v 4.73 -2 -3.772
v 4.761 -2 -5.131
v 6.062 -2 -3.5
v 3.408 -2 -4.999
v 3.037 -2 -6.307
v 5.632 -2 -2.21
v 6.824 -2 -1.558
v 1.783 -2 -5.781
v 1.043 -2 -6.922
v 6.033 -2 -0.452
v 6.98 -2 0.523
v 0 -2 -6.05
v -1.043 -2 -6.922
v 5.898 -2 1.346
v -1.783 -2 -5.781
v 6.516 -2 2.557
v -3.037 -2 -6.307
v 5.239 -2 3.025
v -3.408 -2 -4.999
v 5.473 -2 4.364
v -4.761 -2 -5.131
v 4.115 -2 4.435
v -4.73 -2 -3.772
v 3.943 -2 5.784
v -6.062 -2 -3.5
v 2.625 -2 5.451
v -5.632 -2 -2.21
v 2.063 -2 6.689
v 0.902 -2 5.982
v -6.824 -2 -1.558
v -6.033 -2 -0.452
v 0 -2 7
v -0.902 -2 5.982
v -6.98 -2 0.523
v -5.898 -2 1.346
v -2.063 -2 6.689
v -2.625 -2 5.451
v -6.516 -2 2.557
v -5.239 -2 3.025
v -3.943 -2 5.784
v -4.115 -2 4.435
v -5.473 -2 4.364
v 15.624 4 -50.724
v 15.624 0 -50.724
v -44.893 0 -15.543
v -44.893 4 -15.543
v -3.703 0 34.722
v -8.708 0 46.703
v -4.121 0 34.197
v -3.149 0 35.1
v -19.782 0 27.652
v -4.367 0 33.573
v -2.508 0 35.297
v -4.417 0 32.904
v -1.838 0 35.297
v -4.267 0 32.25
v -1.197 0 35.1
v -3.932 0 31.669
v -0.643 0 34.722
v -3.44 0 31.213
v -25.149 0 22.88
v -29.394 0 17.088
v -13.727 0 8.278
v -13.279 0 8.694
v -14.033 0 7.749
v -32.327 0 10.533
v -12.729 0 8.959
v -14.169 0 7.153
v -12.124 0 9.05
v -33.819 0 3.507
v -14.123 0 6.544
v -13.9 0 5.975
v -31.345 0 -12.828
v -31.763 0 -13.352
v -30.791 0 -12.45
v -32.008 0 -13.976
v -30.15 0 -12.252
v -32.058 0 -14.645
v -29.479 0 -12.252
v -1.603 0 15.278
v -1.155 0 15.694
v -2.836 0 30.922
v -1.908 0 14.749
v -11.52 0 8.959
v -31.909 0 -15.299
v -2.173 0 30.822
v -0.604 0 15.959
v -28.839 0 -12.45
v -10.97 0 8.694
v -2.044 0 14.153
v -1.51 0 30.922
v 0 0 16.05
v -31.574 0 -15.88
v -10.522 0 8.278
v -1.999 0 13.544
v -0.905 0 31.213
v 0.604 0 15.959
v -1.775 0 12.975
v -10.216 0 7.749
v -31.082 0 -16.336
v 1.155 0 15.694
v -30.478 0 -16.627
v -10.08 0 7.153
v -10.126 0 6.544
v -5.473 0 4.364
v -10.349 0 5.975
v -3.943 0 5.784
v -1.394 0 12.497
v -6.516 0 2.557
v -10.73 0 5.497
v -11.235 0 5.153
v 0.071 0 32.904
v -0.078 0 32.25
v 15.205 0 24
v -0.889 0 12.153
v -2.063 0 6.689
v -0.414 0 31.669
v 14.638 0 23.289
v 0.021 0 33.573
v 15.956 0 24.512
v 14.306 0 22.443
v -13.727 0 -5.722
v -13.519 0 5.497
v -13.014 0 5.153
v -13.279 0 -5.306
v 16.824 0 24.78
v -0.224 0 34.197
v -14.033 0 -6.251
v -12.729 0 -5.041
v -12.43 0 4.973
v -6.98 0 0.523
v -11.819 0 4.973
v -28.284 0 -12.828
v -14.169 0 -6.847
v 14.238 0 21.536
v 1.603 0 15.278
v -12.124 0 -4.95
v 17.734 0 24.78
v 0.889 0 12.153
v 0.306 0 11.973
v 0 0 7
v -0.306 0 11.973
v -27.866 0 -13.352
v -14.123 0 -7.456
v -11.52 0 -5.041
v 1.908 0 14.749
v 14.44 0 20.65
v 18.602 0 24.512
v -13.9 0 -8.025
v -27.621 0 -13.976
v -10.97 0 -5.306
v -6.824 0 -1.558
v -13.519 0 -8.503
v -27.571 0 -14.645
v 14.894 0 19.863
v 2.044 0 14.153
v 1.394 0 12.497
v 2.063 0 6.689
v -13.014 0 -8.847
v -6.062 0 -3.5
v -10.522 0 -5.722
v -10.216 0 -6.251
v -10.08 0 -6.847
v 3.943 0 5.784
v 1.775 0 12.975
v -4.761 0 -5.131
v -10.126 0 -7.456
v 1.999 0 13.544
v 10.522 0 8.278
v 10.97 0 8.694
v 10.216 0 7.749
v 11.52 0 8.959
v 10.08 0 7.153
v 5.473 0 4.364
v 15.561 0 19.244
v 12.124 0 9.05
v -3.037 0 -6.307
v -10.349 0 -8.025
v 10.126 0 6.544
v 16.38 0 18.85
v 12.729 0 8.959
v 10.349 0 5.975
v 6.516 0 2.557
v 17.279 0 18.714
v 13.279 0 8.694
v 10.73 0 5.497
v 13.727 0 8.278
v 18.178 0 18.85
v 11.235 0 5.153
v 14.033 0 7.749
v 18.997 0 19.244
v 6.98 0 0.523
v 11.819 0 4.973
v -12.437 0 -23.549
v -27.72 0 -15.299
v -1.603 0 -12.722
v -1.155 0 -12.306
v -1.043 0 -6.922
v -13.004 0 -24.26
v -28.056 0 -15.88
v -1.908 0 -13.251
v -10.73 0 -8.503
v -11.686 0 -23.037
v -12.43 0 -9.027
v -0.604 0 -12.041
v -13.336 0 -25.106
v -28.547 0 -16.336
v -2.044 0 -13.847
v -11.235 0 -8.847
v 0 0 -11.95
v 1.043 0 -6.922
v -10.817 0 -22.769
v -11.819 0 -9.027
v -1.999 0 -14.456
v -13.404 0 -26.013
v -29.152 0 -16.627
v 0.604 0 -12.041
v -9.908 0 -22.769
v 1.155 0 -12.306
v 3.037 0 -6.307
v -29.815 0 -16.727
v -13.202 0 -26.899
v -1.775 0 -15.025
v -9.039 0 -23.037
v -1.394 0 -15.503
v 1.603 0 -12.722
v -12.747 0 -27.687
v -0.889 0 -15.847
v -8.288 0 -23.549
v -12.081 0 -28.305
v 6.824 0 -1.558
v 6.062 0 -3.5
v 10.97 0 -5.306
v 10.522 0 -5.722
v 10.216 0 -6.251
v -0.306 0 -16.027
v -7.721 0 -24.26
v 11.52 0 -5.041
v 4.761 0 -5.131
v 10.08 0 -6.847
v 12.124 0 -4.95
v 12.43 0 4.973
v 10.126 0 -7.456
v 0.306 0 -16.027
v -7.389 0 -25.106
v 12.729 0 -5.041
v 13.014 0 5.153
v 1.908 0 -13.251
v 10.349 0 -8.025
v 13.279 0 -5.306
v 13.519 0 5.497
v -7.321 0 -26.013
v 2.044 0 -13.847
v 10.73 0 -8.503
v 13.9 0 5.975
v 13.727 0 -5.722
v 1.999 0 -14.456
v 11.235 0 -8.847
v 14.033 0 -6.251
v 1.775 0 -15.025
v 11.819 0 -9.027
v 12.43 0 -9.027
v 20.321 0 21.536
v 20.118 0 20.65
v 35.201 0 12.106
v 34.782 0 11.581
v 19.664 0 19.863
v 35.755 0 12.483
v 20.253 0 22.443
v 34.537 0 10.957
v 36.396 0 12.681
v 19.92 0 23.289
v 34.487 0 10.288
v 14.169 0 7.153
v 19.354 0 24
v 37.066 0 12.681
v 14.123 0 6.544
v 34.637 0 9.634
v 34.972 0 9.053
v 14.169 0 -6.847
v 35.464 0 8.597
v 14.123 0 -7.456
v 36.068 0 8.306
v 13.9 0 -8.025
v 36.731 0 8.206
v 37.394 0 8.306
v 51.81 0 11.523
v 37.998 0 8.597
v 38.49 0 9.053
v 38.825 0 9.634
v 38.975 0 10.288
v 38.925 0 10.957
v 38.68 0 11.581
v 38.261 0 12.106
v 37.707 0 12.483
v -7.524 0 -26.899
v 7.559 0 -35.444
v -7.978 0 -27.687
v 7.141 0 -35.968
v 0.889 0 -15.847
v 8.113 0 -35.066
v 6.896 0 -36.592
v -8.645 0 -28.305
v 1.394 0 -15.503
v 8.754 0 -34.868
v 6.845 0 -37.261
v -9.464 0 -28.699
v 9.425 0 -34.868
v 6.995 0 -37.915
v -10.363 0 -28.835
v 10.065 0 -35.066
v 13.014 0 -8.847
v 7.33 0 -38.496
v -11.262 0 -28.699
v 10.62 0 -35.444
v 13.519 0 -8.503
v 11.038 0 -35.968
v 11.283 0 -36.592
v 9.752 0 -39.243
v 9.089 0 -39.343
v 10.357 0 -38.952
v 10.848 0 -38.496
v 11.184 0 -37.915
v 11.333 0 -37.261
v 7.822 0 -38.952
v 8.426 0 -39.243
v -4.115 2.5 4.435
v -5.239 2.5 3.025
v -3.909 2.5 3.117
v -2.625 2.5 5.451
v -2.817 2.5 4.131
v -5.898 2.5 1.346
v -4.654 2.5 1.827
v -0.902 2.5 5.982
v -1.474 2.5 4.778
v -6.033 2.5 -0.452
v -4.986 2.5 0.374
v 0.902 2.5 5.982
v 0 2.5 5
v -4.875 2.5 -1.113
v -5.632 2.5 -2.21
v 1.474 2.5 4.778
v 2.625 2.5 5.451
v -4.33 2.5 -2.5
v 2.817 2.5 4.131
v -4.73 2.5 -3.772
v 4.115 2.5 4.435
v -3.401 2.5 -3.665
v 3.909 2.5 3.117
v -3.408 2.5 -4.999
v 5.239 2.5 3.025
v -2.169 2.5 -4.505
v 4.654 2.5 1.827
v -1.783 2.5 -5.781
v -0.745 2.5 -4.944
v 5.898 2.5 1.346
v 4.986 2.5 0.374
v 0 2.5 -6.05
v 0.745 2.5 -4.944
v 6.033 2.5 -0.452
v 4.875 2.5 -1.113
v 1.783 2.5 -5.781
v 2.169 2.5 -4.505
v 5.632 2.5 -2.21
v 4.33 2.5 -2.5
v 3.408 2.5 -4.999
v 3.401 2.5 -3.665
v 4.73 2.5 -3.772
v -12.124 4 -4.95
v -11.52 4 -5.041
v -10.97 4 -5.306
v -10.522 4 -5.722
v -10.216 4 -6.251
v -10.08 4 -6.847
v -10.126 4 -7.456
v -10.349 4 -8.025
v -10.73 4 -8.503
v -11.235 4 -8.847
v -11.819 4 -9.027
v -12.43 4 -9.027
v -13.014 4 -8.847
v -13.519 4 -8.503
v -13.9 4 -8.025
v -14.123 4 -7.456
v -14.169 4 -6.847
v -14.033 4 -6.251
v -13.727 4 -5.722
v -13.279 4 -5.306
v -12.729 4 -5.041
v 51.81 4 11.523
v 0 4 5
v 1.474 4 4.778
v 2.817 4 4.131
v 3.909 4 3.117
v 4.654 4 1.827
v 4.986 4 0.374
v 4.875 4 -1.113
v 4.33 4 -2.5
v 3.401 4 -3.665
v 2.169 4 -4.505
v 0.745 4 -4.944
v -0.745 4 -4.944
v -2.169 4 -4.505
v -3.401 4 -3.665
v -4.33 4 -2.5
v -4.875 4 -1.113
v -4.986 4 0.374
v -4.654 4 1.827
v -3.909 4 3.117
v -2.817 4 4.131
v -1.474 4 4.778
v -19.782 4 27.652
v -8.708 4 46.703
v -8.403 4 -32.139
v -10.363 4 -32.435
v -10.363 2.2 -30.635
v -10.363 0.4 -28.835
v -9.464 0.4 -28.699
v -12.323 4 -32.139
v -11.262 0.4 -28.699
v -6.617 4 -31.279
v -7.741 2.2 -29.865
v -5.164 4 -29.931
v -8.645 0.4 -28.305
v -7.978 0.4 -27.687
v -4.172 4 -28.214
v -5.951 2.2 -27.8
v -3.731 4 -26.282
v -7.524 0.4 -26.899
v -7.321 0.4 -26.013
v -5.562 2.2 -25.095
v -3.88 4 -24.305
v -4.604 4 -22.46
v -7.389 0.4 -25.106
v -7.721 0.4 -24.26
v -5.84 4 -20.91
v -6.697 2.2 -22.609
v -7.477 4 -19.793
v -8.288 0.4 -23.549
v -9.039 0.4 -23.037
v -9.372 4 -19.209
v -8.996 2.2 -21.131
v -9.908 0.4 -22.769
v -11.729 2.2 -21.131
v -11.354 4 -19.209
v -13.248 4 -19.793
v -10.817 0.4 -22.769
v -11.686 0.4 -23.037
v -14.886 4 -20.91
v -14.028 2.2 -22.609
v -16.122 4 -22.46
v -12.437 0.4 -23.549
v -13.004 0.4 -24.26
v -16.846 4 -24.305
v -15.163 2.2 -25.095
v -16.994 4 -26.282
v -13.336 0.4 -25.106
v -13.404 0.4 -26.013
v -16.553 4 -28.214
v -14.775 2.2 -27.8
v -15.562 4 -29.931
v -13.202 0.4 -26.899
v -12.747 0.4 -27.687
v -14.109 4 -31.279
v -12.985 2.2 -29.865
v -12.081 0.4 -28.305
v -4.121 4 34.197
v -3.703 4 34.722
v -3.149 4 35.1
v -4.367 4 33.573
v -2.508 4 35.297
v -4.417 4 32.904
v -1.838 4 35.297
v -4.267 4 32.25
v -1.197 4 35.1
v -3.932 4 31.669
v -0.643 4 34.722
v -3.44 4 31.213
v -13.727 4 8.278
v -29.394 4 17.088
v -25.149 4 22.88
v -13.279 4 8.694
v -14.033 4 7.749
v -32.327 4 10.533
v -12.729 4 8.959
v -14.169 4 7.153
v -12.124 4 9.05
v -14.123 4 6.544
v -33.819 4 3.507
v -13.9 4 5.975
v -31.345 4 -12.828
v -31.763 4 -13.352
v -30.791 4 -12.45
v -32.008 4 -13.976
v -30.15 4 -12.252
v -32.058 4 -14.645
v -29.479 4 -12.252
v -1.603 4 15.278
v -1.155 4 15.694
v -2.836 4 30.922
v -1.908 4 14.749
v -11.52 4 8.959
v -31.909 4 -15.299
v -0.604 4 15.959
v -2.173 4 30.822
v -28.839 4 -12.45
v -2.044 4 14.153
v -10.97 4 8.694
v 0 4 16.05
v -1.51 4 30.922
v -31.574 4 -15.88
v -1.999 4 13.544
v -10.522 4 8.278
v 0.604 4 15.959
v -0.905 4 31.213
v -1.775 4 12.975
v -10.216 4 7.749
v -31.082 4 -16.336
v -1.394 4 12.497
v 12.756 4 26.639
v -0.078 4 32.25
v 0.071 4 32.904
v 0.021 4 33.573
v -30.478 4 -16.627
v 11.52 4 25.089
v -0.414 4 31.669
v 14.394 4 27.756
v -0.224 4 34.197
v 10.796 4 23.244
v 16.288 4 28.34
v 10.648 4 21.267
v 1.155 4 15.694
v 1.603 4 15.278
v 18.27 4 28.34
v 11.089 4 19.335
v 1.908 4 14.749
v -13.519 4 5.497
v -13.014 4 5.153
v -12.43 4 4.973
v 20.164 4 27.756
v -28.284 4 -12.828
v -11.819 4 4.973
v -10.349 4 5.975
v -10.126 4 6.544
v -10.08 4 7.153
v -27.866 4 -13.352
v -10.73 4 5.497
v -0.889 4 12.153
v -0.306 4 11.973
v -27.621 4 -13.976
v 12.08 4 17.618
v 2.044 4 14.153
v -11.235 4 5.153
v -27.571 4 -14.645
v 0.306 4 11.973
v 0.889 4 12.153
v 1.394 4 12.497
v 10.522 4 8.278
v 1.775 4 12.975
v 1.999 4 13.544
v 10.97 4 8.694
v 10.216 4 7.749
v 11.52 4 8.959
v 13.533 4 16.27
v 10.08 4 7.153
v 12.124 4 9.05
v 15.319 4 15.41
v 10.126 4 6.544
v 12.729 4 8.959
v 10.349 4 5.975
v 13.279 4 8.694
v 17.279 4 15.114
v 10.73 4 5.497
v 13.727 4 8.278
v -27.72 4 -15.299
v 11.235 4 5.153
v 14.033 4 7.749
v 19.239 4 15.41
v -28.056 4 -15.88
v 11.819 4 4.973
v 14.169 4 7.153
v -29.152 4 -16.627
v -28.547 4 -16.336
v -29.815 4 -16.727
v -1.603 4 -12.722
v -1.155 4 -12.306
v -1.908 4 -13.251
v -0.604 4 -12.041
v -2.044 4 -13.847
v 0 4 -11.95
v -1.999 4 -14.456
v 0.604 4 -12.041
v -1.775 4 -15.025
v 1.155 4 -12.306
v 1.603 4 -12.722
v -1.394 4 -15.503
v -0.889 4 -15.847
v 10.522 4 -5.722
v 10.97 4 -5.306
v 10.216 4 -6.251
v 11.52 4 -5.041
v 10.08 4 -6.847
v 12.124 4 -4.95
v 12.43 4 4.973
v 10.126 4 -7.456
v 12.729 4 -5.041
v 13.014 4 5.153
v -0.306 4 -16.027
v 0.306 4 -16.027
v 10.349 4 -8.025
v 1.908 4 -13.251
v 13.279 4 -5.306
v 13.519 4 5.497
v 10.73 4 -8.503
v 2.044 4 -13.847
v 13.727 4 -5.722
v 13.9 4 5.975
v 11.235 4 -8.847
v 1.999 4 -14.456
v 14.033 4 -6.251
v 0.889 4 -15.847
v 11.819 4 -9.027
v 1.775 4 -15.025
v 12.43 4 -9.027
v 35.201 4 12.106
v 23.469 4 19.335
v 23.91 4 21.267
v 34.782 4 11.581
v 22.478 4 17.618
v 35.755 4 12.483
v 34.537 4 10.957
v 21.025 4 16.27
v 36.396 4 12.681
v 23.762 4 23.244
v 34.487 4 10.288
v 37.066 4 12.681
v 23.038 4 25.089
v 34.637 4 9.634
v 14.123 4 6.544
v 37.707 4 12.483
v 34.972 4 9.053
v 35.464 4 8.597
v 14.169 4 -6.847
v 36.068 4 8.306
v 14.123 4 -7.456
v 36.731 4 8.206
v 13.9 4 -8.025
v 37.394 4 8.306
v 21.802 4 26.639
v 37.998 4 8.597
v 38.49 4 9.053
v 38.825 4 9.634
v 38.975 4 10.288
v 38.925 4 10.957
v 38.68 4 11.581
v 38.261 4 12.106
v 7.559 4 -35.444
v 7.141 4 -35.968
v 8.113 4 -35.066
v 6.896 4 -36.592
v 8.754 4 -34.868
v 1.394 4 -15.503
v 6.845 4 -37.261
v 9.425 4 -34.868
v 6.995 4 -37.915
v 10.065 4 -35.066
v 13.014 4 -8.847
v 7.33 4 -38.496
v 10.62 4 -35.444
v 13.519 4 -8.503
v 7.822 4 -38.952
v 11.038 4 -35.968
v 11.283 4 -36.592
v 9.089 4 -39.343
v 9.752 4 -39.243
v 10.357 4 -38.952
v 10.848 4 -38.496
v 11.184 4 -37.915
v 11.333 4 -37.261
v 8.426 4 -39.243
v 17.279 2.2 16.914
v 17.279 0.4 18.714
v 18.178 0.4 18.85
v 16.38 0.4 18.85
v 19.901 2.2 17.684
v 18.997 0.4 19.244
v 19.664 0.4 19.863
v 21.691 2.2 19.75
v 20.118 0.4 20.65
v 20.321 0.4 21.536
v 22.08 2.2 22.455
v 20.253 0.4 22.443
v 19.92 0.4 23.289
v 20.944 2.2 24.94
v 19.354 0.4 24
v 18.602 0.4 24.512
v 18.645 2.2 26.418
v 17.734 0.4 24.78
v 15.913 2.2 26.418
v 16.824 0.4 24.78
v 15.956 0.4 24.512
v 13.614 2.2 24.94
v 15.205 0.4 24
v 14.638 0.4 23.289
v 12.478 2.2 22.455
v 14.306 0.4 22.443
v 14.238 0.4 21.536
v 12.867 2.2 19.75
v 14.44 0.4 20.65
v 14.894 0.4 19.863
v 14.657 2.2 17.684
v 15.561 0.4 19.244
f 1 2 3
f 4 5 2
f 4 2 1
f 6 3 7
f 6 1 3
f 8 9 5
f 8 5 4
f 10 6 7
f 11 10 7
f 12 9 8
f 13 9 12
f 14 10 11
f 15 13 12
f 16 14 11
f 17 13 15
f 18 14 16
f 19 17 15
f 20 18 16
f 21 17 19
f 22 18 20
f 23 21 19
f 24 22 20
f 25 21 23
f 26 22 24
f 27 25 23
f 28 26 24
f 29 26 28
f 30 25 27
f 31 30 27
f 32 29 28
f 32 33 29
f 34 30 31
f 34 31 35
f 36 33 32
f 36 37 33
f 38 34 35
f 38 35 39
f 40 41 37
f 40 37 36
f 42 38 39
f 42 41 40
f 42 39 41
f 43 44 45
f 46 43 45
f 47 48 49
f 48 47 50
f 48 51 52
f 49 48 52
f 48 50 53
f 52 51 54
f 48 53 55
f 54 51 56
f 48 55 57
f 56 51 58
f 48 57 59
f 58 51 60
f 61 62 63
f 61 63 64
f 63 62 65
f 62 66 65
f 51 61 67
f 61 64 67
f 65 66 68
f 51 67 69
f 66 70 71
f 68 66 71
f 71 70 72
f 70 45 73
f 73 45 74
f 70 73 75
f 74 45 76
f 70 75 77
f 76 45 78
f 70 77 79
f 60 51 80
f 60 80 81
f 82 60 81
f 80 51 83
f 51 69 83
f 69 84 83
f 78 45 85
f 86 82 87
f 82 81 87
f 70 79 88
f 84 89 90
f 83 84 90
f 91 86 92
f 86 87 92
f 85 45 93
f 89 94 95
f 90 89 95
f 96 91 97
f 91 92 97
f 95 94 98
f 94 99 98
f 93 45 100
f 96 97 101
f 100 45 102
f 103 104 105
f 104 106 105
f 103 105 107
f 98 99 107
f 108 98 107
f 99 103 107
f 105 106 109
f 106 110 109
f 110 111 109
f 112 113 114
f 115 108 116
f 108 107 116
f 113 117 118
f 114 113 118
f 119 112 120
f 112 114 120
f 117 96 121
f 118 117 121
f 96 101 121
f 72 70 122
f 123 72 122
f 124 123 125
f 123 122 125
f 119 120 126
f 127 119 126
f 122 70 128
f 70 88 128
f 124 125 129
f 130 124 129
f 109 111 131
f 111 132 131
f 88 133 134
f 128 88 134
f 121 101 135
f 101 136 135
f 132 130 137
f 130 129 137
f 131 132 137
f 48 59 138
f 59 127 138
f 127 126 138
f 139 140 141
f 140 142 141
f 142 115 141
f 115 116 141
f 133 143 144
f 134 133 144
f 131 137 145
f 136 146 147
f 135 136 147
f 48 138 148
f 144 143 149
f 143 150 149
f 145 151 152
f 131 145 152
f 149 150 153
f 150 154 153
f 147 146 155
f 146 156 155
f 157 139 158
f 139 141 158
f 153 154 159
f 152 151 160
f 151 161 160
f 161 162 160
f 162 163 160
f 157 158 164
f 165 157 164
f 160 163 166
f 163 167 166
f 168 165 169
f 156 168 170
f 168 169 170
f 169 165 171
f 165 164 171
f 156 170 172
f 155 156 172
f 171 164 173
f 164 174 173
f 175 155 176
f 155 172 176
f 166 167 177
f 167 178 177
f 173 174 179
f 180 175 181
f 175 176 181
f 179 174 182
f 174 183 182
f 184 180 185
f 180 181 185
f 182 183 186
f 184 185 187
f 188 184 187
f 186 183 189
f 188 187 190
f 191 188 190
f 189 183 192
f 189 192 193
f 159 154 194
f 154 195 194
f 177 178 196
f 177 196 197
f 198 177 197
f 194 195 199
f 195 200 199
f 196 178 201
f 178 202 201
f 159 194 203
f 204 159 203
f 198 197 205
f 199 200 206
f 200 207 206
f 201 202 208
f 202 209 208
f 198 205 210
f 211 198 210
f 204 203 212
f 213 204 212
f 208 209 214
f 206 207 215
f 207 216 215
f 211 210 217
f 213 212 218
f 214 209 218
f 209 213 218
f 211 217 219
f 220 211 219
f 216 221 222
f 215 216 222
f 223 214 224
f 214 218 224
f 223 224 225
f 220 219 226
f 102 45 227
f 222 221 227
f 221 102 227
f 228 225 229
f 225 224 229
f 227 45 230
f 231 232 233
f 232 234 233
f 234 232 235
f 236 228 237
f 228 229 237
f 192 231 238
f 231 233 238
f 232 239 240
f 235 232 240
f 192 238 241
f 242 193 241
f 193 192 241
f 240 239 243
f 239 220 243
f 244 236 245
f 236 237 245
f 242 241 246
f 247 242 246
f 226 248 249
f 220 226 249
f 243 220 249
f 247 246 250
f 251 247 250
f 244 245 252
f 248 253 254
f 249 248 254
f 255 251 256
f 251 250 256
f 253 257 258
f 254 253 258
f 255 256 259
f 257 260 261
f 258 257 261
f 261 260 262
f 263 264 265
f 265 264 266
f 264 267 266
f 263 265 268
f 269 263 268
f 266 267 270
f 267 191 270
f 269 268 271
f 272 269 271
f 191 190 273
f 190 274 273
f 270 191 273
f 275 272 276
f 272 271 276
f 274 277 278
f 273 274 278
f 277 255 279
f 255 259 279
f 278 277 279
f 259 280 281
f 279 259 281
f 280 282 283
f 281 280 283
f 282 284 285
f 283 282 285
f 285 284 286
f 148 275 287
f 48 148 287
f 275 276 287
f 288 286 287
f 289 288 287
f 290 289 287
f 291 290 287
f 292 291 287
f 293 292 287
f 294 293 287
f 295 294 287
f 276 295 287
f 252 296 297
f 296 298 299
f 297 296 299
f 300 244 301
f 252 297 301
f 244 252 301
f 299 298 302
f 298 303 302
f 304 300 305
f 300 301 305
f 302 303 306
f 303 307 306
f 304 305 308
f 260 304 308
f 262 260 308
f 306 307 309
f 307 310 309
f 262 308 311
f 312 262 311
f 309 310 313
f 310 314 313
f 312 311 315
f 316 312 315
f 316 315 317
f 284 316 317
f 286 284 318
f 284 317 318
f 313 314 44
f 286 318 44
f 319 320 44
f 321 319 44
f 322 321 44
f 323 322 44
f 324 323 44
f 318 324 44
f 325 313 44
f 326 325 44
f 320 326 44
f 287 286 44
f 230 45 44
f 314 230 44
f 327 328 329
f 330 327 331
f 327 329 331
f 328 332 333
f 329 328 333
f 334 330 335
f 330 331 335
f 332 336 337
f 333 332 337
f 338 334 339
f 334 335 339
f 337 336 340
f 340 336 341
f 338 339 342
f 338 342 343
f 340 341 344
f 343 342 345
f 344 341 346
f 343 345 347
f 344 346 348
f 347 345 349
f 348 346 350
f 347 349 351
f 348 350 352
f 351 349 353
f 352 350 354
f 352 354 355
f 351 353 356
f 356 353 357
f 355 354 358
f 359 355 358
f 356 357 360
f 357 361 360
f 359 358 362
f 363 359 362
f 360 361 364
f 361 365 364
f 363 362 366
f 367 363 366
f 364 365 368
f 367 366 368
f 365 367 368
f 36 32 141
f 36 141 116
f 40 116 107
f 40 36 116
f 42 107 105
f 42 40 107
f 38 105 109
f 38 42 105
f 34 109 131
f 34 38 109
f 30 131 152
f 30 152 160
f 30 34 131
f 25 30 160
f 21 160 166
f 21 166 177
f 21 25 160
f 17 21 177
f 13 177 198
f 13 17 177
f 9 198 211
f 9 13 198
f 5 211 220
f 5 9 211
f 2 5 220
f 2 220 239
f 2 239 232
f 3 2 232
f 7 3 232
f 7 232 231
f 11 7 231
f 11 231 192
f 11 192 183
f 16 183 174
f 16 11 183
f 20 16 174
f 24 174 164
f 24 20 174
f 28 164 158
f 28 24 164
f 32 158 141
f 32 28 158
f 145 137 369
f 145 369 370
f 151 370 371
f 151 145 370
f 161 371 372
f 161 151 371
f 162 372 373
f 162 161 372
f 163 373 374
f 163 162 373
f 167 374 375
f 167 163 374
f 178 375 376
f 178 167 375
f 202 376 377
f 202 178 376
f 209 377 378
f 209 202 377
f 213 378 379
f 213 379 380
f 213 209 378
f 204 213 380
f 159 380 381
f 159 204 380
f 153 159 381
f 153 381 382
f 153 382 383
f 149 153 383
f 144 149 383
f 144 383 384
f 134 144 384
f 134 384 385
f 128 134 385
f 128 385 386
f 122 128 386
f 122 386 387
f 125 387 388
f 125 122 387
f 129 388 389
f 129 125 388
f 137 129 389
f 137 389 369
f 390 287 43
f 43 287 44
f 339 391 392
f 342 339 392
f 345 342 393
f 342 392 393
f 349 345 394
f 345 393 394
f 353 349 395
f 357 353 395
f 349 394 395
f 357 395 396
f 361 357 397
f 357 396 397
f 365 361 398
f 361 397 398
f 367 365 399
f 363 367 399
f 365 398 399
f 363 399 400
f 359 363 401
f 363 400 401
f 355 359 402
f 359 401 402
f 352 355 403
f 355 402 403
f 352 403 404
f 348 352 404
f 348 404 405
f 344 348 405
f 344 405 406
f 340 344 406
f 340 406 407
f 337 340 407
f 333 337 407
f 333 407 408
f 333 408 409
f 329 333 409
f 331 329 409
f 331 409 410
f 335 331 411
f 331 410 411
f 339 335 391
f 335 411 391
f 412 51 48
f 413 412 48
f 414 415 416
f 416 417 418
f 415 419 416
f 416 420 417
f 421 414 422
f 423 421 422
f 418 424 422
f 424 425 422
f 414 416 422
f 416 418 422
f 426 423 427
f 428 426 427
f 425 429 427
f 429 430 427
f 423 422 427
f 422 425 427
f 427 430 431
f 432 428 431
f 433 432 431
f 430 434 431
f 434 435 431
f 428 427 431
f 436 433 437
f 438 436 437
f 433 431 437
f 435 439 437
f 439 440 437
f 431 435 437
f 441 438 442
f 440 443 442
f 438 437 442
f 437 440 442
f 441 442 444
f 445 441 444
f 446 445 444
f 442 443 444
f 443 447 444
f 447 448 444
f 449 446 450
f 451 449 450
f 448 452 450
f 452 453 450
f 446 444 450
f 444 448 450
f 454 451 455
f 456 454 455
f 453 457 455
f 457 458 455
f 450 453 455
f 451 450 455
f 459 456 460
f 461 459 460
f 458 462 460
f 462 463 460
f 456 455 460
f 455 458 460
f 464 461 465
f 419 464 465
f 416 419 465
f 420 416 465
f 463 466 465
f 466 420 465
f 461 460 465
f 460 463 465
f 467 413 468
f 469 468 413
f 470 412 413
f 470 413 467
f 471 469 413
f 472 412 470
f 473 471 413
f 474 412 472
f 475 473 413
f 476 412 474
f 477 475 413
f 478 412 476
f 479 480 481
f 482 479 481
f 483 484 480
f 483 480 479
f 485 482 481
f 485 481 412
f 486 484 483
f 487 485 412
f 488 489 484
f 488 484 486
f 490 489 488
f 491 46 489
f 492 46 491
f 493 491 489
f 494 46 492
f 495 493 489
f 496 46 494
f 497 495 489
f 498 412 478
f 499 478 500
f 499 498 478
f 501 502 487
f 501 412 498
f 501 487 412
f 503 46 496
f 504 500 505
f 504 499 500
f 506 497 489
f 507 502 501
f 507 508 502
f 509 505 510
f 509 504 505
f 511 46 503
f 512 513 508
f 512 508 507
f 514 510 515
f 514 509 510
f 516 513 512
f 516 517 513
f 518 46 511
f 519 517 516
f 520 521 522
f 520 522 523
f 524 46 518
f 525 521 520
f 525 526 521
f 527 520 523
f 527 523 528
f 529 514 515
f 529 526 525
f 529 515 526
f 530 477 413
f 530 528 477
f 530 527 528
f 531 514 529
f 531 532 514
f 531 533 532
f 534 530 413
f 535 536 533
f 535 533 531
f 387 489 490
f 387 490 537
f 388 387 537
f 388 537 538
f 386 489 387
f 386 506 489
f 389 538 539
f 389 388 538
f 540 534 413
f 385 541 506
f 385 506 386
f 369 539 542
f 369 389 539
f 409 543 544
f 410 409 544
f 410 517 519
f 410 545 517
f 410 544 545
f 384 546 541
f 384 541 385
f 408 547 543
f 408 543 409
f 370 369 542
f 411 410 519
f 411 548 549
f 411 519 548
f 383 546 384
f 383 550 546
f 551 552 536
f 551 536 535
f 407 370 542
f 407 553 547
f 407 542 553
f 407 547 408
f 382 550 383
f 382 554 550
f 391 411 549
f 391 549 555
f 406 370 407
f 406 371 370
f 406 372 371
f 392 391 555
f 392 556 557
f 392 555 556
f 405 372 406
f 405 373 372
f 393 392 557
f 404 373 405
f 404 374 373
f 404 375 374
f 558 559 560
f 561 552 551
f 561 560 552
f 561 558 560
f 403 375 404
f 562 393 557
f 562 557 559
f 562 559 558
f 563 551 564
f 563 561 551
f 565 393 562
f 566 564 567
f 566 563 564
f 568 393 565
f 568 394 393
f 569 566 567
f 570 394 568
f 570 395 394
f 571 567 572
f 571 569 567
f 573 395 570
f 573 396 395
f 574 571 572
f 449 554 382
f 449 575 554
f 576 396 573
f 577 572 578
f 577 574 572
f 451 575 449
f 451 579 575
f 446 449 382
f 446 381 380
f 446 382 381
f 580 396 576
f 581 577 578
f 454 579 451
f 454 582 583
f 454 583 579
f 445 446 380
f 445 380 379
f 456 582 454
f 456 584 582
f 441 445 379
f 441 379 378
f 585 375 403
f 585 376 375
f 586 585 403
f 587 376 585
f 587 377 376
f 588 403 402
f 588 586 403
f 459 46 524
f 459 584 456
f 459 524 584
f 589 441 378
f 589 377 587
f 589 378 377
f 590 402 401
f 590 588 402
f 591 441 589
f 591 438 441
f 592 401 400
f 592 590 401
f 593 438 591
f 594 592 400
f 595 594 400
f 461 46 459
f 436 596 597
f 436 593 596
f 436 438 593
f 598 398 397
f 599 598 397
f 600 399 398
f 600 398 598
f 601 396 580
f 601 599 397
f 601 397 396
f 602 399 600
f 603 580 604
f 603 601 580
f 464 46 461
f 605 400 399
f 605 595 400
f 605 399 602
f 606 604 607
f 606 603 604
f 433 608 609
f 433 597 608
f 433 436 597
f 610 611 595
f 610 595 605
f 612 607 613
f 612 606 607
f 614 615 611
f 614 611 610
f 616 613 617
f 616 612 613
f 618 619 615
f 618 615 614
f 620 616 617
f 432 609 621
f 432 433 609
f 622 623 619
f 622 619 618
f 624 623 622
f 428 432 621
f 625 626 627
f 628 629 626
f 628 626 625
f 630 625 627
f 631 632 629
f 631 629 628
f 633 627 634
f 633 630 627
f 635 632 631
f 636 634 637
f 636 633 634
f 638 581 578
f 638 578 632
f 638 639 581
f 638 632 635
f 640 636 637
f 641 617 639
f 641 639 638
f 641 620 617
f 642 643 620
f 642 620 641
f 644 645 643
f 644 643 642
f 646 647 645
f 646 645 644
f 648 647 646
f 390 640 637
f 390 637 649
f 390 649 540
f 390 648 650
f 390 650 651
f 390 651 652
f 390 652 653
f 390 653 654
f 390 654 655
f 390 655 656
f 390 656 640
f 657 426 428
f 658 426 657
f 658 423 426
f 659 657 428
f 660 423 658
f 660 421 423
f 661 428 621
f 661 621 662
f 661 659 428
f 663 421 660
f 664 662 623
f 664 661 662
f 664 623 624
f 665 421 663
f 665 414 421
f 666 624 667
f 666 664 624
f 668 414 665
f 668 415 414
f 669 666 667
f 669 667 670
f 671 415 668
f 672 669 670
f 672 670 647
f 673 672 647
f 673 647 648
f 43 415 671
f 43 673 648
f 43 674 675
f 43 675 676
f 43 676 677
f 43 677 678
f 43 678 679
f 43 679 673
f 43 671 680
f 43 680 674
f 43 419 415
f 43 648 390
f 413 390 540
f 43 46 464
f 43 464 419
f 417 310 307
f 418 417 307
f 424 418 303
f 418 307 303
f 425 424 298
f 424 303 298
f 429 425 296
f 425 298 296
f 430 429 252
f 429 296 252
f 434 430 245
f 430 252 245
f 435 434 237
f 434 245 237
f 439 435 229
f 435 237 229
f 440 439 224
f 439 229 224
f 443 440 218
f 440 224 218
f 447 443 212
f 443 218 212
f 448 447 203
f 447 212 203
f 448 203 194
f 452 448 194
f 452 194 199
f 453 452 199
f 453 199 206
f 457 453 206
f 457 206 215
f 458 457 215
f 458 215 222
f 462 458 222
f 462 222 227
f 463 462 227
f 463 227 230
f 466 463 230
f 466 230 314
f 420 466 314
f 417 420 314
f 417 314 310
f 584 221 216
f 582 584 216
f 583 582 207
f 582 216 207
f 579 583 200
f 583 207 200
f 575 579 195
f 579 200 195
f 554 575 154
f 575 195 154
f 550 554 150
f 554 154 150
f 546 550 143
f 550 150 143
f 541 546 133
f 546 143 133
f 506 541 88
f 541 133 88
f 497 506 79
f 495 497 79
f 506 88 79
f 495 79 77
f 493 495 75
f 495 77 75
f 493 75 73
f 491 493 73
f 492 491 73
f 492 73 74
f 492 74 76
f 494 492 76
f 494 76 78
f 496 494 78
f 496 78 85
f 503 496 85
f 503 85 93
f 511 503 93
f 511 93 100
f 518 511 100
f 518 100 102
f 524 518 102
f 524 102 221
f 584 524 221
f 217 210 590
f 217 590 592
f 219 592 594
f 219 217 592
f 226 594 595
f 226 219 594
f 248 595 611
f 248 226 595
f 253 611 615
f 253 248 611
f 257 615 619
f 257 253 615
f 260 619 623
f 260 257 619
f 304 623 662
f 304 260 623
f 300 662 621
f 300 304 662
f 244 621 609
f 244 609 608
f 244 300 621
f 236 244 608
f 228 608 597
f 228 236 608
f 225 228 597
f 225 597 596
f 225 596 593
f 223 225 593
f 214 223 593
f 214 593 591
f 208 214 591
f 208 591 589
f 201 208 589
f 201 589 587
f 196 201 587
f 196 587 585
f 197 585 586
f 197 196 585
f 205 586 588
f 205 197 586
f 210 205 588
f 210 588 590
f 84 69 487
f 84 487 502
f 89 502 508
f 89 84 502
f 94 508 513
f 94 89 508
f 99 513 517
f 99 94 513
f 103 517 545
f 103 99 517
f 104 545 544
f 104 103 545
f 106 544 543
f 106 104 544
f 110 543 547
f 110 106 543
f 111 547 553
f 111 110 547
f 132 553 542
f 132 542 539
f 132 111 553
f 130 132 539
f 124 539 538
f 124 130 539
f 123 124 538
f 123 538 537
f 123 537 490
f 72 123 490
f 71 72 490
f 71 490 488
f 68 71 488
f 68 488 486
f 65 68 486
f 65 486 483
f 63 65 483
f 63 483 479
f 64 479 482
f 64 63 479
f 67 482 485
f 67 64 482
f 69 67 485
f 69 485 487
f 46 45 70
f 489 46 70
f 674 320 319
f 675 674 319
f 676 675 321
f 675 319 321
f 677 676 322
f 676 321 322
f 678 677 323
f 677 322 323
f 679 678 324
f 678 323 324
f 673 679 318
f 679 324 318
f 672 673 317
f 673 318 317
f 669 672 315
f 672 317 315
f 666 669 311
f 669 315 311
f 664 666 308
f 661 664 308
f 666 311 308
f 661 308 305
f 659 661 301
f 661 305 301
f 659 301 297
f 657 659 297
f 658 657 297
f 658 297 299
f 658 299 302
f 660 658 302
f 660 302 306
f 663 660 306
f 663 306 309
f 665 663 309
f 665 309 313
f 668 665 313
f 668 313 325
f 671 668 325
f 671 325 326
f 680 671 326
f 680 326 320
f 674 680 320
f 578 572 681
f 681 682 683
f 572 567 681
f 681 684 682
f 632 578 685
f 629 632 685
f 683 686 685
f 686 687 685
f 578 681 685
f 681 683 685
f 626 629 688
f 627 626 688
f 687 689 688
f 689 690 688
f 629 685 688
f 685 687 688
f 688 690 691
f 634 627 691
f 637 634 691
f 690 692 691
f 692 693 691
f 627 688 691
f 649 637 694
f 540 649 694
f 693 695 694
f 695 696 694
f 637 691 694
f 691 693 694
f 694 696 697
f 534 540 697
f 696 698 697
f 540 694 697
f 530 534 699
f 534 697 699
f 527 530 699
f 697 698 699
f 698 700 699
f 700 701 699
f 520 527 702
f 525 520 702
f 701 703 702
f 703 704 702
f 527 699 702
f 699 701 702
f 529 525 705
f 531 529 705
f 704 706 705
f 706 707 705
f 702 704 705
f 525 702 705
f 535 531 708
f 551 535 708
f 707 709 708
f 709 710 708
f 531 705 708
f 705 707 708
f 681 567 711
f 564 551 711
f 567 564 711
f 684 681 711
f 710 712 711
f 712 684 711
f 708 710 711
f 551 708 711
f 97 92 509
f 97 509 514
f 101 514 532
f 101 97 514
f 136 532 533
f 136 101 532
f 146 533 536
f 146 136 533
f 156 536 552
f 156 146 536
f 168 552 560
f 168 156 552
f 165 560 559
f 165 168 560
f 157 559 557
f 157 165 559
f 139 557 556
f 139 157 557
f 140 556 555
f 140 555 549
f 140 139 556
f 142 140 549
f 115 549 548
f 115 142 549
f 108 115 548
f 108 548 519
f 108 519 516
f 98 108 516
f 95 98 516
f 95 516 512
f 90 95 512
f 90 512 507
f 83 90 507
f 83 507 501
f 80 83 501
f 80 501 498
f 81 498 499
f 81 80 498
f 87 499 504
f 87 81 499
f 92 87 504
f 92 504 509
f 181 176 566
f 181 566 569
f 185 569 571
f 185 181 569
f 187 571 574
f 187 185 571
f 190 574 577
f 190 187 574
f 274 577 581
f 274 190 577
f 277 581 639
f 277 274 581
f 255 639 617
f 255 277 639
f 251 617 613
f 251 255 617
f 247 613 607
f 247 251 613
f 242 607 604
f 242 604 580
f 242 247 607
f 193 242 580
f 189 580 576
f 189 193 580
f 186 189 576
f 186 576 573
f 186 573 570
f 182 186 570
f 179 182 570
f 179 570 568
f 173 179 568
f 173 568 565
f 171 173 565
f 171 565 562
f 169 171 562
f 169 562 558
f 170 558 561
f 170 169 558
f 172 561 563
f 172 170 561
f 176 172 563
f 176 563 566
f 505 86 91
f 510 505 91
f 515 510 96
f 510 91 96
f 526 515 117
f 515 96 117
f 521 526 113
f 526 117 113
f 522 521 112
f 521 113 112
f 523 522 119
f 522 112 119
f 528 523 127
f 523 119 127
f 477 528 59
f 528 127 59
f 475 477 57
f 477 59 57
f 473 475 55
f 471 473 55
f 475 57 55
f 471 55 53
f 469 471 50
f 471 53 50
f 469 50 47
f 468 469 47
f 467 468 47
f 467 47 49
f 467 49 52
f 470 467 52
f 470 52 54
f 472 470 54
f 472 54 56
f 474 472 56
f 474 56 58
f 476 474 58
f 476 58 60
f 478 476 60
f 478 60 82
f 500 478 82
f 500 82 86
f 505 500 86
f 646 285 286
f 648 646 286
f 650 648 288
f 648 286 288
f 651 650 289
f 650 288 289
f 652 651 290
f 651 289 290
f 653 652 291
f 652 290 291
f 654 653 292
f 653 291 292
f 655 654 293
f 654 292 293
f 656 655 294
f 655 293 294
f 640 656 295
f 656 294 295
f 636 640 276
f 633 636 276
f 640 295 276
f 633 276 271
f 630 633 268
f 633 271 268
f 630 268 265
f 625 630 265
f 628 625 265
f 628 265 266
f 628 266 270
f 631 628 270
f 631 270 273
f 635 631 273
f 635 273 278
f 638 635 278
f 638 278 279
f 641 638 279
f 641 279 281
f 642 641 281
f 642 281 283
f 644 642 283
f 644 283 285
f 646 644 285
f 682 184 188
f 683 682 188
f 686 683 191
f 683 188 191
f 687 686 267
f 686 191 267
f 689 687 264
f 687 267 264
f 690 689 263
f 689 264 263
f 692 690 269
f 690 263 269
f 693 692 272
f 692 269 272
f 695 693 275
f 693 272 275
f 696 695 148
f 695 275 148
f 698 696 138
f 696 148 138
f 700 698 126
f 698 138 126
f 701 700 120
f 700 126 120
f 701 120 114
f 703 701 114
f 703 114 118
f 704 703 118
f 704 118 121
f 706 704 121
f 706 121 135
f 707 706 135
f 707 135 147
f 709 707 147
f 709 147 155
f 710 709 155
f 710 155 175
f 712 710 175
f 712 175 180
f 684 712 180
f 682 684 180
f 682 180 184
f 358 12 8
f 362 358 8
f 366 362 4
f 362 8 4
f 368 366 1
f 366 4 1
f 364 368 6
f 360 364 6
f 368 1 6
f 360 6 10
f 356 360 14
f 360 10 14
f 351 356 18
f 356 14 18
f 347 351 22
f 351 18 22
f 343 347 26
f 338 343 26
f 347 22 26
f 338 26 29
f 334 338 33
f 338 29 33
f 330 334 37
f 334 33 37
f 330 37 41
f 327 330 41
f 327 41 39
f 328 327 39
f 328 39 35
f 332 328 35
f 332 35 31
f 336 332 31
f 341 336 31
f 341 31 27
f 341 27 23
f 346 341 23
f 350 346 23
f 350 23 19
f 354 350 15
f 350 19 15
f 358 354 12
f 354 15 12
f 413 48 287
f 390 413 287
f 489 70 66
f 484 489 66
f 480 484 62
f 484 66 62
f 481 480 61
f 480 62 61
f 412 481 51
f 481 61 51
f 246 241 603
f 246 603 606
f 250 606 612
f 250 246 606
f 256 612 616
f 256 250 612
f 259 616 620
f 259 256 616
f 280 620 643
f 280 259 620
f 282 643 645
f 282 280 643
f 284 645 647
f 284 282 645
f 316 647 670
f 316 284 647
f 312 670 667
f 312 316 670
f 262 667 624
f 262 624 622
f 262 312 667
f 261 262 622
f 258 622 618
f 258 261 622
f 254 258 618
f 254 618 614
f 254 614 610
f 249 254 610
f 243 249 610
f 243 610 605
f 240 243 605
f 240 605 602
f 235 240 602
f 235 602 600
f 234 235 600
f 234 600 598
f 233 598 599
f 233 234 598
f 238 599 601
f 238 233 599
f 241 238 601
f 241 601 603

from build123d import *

# Parameters (mm, degrees)
SKETCH_1_R          = 34
SKETCH_1_R_2        = 2.05
SKETCH_1_R_3        = 6
EXTRUDE_1_DEPTH     = 4
SKETCH_5_R          = 6.5
SKETCH_5_R_2        = 5
EXTRUDE_4_DEPTH     = 1.5
EXTRUDE_START       = 2
SKETCH_6_R          = 7
SKETCH_6_R_2        = 6
EXTRUDE_5_DEPTH     = 2
EXTRUDE_START_2     = -4
EXTRUDE_6_DEPTH     = 4
SKETCH_9_R          = 2.25
SKETCH_9_R_2        = 3.05
CUT_EXTRUDE_1_DEPTH = 10
CHAMFER_2_SIZE      = 3.6
SKETCH_10_R         = 6.05
CUT_EXTRUDE_3_DEPTH = 4.5


with BuildPart() as part:
    # 草图1 → 凸台-拉伸1 (new body)
    with BuildSketch(Plane(origin=(0, 0, 0), x_dir=(1, 0, 0), z_dir=(0, 1, 0))):
        with Locations(Location((0, 0, 0), (0, 0, 270))):
            Circle(SKETCH_1_R)
        with Locations(Location((0, 14, 0), (0, 0, 270))):
            Circle(SKETCH_1_R_2, mode=Mode.SUBTRACT)
        with Locations(Location((12.124355653, 7, 0), (0, 0, 270))):
            Circle(SKETCH_1_R_2, mode=Mode.SUBTRACT)
        with Locations(Location((12.124355653, -7, 0), (0, 0, 270))):
            Circle(SKETCH_1_R_2, mode=Mode.SUBTRACT)
        with Locations(Location((0, -14, 0), (0, 0, 270))):
            Circle(SKETCH_1_R_2, mode=Mode.SUBTRACT)
        with Locations(Location((-12.124355653, -7, 0), (0, 0, 270))):
            Circle(SKETCH_1_R_2, mode=Mode.SUBTRACT)
        with Locations(Location((-12.124355653, 7, 0), (0, 0, 270))):
            Circle(SKETCH_1_R_2, mode=Mode.SUBTRACT)
        with Locations(Location((0, 0, 0), (0, 0, 270))):
            Circle(SKETCH_1_R_3, mode=Mode.SUBTRACT)
    extrude(amount=EXTRUDE_1_DEPTH)

    # 草图5 → 凸台-拉伸4 (add)
    with BuildSketch(Plane(origin=(0, 4, 0), x_dir=(1, 0, 0), z_dir=(0, 1, 0))):
        Circle(SKETCH_5_R)
        with Locations(Location((0, 0, 0), (0, 0, 270))):
            Circle(SKETCH_5_R_2, mode=Mode.SUBTRACT)
    extrude(amount=-EXTRUDE_4_DEPTH)

    # 草图6 → 凸台-拉伸5 (add)
    with BuildSketch(Plane(origin=(0, 0, 0), x_dir=(-1, 0, 0), z_dir=(0, -1, 0)).offset(EXTRUDE_START)):
        with Locations(Location((0, 0, 0), (0, 0, 270))):
            Circle(SKETCH_6_R)
        with Locations(Location((0, 0, 0), (0, 0, 90))):
            Circle(SKETCH_6_R_2, mode=Mode.SUBTRACT)
    extrude(amount=-EXTRUDE_5_DEPTH)

    # 草图8 → 凸台-拉伸6 (add)
    with BuildSketch(Plane(origin=(0, 4, 0), x_dir=(1, 0, 0), z_dir=(0, 1, 0)).offset(EXTRUDE_START_2)):
        with BuildLine():
            Line((-8.707638575, -46.70307303), (51.809561134, -11.522559398))
            Line((51.809561134, -11.522559398), (15.62388997, 50.723703159))
            Line((15.62388997, 50.723703159), (-44.893309739, 15.543189527))
            Line((-44.893309739, 15.543189527), (-33.818604688, -3.507417415))
            ThreePointArc((-33.818604688, -3.507417415), (-1.756052475, 33.954620889), (34, 0))
            ThreePointArc((34, 0), (15.546708924, -30.237391449), (-19.782343625, -27.652466087))
            Line((-19.782343625, -27.652466087), (-8.707638575, -46.70307303))
        make_face()
    extrude(amount=EXTRUDE_6_DEPTH)

    # 草图9 → 切除-拉伸1 (cut)
    with BuildSketch(Plane(origin=(0, 0, 0), x_dir=(-1, 0, 0), z_dir=(0, -1, 0))):
        with Locations(Location((-36.730998817, -10.456276868, 0), (0, 0, 90))):
            Circle(SKETCH_9_R)
        with Locations(Location((-9.089166677, 37.092951475, 0), (0, 0, 90))):
            Circle(SKETCH_9_R)
        with Locations(Location((-17.279041767, -21.764299107, 0), (0, 0, 90))):
            Circle(SKETCH_9_R_2)
        with Locations(Location((2.172915282, -33.072321345, 0), (0, 0, 90))):
            Circle(SKETCH_9_R)
        with Locations(Location((29.814747421, 14.476906997, 0), (0, 0, 90))):
            Circle(SKETCH_9_R)
        with Locations(Location((10.362790372, 25.784929236, 0), (0, 0, 90))):
            Circle(SKETCH_9_R_2)
    extrude(amount=-CUT_EXTRUDE_1_DEPTH, mode=Mode.SUBTRACT)

    # 倒角2
    chamfer_2_edges = [part.edges().sort_by_distance(p)[0] for p in [
        (17.279041767, 4, 24.814299107),
        (-10.362790372, 4, -22.734929236),
    ]]
    chamfer(chamfer_2_edges, length=CHAMFER_2_SIZE)

    # 草图10 → 切除-拉伸3 (cut)
    with BuildSketch(Plane(origin=(0, -2, 0), x_dir=(-1, 0, 0), z_dir=(0, -1, 0))):
        with Locations(Location((0, 0, 0), (0, 0, 90))):
            Circle(SKETCH_10_R)
    extrude(amount=-CUT_EXTRUDE_3_DEPTH, mode=Mode.SUBTRACT)


solid = part.part
